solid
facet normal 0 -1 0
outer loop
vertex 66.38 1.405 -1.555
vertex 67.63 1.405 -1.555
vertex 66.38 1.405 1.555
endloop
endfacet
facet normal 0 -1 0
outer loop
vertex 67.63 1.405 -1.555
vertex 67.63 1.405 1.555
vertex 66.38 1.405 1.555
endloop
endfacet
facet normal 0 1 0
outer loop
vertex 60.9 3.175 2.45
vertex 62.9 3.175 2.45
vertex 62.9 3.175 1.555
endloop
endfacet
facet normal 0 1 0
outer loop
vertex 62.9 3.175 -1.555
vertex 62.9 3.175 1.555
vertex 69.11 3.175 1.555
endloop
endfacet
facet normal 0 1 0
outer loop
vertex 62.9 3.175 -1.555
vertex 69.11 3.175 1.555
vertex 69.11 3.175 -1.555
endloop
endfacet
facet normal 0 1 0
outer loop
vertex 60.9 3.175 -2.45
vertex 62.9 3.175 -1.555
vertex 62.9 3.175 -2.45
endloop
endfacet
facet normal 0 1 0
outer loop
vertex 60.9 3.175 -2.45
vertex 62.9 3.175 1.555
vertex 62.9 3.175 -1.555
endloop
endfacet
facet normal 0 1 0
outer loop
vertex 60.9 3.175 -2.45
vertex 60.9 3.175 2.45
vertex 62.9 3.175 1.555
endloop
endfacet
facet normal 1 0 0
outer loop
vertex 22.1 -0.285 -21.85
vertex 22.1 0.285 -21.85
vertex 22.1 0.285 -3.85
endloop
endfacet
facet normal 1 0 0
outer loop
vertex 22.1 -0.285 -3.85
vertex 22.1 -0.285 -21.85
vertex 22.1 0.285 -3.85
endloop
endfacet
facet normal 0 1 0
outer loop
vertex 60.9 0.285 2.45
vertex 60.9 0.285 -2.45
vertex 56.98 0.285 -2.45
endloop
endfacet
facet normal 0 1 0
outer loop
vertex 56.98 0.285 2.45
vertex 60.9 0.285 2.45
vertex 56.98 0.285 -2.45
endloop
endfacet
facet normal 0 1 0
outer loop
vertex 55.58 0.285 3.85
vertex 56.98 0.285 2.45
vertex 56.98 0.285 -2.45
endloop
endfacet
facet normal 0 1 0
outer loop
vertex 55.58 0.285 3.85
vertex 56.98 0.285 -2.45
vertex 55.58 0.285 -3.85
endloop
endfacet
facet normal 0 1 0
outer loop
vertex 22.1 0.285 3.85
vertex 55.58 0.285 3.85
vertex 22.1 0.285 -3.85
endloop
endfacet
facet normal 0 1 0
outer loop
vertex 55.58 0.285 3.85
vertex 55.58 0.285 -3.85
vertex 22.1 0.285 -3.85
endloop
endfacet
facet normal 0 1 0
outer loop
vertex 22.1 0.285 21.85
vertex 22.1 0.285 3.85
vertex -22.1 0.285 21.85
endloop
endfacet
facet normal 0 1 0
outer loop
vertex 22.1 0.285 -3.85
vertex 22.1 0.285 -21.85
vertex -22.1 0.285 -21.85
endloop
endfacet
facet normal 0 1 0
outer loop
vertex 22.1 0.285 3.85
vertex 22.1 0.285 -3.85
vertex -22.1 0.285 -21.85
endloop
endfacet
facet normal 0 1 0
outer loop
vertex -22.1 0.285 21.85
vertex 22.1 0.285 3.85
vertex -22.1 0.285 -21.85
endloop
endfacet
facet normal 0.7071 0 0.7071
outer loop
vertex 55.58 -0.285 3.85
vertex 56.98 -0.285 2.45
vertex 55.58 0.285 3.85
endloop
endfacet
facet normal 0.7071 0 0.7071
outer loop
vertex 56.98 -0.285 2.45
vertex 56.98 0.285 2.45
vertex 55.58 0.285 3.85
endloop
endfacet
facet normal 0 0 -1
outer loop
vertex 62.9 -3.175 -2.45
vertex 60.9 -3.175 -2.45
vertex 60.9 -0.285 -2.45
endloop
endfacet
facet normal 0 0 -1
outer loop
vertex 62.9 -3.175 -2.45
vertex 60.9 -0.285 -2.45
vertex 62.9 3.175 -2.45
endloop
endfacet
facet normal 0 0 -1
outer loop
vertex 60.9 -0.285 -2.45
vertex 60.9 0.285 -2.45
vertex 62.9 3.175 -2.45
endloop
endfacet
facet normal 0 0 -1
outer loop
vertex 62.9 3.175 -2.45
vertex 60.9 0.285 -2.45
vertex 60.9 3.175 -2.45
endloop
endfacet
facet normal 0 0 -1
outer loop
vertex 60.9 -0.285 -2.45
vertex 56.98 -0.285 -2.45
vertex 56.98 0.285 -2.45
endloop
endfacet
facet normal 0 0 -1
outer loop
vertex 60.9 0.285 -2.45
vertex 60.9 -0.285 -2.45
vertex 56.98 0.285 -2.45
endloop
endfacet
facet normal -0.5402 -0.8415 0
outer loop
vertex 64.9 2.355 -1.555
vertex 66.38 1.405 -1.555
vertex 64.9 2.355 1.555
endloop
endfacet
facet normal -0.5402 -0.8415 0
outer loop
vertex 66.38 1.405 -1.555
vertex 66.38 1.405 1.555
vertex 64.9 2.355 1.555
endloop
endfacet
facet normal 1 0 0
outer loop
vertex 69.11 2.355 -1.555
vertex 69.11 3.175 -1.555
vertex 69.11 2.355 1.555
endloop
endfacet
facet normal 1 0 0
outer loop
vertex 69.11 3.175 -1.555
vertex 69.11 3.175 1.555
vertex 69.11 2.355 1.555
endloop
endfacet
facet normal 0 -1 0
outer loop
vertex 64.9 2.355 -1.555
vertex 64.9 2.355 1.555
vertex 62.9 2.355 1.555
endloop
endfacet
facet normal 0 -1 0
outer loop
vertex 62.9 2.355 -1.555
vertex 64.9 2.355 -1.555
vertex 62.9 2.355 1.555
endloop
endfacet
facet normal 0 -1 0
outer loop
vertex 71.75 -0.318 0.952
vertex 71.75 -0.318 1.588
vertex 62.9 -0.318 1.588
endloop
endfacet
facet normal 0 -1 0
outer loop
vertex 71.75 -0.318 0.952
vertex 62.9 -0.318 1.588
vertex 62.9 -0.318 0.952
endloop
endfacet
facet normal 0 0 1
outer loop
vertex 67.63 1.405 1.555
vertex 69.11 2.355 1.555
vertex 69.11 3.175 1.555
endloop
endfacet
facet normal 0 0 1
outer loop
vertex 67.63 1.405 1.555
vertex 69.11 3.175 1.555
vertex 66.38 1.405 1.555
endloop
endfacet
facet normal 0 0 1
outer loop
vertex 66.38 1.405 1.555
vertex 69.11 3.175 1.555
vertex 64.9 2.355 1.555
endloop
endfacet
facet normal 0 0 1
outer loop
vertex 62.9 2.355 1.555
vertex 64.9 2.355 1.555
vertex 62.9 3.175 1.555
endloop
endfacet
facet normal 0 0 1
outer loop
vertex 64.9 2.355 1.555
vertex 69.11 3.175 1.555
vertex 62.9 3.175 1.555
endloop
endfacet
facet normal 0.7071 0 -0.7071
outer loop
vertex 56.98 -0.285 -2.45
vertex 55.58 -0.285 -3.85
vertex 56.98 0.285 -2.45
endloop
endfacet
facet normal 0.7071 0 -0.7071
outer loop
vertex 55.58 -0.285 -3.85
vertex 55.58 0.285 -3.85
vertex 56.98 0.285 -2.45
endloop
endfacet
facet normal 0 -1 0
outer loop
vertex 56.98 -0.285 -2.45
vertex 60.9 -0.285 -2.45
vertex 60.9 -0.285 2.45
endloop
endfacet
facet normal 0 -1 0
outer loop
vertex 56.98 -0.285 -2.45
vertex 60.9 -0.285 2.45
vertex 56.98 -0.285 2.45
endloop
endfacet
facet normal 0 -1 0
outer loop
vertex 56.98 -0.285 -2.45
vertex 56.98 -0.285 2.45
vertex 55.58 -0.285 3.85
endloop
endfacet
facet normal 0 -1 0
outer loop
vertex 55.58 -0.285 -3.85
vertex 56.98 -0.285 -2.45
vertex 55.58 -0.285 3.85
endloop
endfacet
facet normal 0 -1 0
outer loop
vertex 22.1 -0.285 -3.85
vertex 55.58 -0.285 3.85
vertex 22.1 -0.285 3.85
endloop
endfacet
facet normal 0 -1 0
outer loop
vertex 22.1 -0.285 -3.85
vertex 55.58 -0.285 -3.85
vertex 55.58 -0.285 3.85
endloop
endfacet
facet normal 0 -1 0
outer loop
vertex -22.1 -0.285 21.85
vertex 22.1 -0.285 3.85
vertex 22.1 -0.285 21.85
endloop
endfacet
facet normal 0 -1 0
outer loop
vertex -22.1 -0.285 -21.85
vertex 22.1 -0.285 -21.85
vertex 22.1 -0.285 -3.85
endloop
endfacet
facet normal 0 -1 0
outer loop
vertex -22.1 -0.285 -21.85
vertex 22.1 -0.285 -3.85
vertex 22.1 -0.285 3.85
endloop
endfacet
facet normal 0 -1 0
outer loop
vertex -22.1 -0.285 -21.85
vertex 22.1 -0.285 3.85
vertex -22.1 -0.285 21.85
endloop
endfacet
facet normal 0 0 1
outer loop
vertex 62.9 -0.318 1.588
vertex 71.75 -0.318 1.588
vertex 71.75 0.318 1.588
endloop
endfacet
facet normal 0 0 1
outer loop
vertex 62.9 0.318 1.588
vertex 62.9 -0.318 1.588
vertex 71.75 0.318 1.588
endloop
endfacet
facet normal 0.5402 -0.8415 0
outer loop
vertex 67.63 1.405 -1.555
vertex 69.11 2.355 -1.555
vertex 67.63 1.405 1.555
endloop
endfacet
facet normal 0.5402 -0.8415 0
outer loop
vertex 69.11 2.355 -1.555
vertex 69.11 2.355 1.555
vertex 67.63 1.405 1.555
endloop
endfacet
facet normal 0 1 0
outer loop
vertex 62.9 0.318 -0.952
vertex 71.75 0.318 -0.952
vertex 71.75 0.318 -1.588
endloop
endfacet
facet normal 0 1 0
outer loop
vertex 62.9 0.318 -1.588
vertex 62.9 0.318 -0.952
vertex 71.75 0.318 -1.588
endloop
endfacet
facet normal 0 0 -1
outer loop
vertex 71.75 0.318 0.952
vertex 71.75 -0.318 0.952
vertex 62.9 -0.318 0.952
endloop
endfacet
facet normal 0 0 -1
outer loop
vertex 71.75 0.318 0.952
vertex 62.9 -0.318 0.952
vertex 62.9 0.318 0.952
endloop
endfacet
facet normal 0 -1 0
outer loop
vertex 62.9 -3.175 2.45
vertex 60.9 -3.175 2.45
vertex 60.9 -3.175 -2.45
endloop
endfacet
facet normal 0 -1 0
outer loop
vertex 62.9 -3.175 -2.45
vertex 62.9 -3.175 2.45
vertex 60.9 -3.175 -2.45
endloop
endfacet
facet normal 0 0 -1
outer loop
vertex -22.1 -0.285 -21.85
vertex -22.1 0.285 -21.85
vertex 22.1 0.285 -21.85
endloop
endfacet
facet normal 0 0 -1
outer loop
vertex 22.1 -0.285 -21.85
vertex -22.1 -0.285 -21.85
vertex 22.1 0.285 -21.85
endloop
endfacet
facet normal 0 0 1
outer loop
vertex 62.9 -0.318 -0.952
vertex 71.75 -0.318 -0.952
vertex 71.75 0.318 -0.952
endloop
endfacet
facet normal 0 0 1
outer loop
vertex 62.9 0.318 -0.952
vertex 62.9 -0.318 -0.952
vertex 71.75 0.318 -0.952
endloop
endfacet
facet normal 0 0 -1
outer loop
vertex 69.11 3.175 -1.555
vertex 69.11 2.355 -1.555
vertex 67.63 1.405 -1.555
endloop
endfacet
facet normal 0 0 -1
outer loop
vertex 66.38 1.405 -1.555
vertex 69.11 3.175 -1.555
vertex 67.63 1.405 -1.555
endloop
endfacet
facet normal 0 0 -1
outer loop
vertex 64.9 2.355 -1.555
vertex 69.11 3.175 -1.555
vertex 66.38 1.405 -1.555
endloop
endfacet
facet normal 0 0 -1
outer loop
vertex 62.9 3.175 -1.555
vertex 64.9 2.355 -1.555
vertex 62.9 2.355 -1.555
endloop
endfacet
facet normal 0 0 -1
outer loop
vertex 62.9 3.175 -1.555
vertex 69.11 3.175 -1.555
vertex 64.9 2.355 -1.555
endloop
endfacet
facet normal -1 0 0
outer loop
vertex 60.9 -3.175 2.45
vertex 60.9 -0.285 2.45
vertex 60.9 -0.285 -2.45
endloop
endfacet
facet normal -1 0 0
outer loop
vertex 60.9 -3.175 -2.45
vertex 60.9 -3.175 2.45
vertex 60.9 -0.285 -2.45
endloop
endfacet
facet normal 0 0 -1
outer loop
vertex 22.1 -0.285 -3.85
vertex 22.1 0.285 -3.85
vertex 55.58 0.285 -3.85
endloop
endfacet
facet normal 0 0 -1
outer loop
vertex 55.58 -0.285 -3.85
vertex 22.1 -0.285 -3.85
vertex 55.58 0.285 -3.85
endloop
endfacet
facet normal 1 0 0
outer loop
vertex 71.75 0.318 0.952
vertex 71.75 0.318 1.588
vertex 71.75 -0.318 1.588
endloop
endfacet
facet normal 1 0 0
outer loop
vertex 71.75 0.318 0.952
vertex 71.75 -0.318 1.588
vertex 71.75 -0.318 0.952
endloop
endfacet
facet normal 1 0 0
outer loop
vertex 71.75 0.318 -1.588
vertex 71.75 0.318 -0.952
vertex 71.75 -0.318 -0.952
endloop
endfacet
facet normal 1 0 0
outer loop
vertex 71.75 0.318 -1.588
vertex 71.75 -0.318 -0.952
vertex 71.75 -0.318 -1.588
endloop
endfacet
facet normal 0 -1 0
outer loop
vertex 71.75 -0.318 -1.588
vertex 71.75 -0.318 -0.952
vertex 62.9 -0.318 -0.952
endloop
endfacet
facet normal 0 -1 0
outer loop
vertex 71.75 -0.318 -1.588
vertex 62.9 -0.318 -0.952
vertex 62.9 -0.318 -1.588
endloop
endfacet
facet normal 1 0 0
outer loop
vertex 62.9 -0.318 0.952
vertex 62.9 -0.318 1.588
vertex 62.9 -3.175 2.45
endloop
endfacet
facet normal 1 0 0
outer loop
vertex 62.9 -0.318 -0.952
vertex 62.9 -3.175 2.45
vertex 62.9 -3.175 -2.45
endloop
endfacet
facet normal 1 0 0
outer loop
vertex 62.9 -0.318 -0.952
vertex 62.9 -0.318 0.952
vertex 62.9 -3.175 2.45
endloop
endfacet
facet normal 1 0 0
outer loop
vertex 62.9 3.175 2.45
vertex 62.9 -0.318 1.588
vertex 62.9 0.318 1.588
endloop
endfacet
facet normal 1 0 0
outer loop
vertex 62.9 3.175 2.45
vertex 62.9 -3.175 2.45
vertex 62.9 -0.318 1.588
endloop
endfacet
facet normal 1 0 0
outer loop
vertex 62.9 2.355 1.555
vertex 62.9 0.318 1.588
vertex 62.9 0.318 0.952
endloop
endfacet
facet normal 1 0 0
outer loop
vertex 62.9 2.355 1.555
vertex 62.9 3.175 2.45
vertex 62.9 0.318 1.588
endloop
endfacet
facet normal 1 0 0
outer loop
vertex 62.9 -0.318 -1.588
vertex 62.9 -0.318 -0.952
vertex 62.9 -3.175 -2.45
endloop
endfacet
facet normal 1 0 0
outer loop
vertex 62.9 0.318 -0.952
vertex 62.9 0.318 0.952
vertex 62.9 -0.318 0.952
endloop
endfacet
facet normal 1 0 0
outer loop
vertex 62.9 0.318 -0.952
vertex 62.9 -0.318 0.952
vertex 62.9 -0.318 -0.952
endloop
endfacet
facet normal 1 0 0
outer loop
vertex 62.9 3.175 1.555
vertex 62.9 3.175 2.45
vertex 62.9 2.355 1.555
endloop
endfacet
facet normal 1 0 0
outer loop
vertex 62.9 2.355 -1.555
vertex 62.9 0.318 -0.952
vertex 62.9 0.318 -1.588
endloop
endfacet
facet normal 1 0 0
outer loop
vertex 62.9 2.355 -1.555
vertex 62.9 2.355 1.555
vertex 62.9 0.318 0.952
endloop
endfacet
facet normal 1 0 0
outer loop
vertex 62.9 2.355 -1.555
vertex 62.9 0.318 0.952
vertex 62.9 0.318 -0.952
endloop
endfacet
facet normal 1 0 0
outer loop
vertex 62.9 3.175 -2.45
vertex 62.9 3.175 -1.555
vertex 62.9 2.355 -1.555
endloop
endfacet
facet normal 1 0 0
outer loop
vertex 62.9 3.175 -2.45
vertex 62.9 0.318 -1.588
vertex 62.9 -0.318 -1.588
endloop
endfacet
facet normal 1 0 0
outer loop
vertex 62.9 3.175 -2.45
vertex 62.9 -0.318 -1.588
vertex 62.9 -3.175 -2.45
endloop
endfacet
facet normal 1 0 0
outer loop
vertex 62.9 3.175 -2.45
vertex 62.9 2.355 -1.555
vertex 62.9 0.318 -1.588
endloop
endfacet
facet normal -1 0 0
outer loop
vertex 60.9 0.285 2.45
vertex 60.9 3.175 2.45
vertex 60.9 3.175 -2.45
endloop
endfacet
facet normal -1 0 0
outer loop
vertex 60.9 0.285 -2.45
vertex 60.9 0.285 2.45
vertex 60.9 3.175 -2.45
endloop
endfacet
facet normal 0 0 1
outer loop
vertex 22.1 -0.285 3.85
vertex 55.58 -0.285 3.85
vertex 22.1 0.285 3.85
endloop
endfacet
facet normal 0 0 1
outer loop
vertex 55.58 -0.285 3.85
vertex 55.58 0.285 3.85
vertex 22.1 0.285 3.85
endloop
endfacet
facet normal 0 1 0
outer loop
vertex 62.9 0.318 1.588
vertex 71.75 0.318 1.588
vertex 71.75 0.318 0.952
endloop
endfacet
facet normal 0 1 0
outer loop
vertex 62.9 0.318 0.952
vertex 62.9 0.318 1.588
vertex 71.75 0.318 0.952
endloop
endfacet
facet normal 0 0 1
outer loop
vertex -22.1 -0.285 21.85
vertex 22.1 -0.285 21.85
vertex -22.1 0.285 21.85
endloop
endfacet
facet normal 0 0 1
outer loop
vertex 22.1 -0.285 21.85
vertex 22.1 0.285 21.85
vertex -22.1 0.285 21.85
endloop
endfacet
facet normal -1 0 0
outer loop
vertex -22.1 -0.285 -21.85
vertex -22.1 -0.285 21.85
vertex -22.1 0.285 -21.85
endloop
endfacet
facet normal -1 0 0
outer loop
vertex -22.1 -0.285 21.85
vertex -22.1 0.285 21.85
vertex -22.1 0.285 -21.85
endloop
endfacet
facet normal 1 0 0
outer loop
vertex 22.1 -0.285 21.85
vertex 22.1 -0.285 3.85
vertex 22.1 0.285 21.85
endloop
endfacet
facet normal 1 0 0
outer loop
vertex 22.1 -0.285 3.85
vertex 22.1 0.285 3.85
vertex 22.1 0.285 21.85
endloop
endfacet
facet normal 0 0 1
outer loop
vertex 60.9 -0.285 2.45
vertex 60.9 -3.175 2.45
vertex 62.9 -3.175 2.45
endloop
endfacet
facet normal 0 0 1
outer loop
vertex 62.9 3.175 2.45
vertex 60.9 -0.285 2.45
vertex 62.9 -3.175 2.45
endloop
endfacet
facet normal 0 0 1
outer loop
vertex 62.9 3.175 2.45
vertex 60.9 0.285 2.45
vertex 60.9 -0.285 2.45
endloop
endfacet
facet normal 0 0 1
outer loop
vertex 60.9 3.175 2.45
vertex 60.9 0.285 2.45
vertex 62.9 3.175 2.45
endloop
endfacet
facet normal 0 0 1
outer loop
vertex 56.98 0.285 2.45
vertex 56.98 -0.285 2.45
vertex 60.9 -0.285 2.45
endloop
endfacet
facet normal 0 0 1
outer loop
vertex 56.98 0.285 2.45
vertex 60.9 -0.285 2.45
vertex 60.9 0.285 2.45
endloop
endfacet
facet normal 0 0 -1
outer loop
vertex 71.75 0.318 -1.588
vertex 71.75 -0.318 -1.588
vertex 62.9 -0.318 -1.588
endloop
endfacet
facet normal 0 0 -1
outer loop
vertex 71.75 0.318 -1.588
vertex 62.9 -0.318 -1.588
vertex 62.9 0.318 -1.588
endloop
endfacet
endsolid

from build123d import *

# Parameters (mm, degrees)
BOSS_EXTRUDE1_DEPTH = 0.285
SKETCH2_W           = 4.9
SKETCH2_H           = 6.35
BOSS_EXTRUDE2_DEPTH = 2
BOSS_EXTRUDE3_DEPTH = 1.555
SKETCH4_W           = 0.635
SKETCH4_H           = 0.635
BOSS_EXTRUDE4_DEPTH = 8.85


with BuildPart() as part:
    # Sketch1 → Boss-Extrude1 (new, symmetric)
    with BuildSketch(Plane(origin=(0, 0, 0), x_dir=(1, 0, 0), z_dir=(0, 1, 0))):
        Polygon((22.1, 3.85), (55.58, 3.85), (56.98, 2.45), (60.9, 2.45), (60.9, -2.45), (56.98, -2.45), (55.58, -3.85), (22.1, -3.85), (22.1, -21.85), (-22.1, -21.85), (-22.1, 21.85), (22.1, 21.85), align=None)
    extrude(amount=BOSS_EXTRUDE1_DEPTH, both=True)

    # Sketch2 → Boss-Extrude2 (add)
    with BuildSketch(Plane(origin=(60.9, 0, 0), x_dir=(0, 0, -1), z_dir=(1, 0, 0))):
        Rectangle(SKETCH2_W, SKETCH2_H)
    extrude(amount=BOSS_EXTRUDE2_DEPTH)

    # Sketch3 → Boss-Extrude3 (add, symmetric)
    with BuildSketch(Plane.XY):
        Polygon((62.9, 3.175), (69.11, 3.175), (69.11, 2.355), (67.63, 1.405), (66.38, 1.405), (64.9, 2.355), (62.9, 2.355), align=None)
    extrude(amount=BOSS_EXTRUDE3_DEPTH, both=True)

    # Sketch4 → Boss-Extrude4 (add)
    with BuildSketch(Plane(origin=(62.9, 0, 0), x_dir=(0, 0, -1), z_dir=(1, 0, 0))):
        with Locations((-1.27, 0)):
            Rectangle(SKETCH4_W, SKETCH4_H)
        with Locations((1.27, 0)):
            Rectangle(SKETCH4_W, SKETCH4_H)
    extrude(amount=BOSS_EXTRUDE4_DEPTH)


solid = part.part
